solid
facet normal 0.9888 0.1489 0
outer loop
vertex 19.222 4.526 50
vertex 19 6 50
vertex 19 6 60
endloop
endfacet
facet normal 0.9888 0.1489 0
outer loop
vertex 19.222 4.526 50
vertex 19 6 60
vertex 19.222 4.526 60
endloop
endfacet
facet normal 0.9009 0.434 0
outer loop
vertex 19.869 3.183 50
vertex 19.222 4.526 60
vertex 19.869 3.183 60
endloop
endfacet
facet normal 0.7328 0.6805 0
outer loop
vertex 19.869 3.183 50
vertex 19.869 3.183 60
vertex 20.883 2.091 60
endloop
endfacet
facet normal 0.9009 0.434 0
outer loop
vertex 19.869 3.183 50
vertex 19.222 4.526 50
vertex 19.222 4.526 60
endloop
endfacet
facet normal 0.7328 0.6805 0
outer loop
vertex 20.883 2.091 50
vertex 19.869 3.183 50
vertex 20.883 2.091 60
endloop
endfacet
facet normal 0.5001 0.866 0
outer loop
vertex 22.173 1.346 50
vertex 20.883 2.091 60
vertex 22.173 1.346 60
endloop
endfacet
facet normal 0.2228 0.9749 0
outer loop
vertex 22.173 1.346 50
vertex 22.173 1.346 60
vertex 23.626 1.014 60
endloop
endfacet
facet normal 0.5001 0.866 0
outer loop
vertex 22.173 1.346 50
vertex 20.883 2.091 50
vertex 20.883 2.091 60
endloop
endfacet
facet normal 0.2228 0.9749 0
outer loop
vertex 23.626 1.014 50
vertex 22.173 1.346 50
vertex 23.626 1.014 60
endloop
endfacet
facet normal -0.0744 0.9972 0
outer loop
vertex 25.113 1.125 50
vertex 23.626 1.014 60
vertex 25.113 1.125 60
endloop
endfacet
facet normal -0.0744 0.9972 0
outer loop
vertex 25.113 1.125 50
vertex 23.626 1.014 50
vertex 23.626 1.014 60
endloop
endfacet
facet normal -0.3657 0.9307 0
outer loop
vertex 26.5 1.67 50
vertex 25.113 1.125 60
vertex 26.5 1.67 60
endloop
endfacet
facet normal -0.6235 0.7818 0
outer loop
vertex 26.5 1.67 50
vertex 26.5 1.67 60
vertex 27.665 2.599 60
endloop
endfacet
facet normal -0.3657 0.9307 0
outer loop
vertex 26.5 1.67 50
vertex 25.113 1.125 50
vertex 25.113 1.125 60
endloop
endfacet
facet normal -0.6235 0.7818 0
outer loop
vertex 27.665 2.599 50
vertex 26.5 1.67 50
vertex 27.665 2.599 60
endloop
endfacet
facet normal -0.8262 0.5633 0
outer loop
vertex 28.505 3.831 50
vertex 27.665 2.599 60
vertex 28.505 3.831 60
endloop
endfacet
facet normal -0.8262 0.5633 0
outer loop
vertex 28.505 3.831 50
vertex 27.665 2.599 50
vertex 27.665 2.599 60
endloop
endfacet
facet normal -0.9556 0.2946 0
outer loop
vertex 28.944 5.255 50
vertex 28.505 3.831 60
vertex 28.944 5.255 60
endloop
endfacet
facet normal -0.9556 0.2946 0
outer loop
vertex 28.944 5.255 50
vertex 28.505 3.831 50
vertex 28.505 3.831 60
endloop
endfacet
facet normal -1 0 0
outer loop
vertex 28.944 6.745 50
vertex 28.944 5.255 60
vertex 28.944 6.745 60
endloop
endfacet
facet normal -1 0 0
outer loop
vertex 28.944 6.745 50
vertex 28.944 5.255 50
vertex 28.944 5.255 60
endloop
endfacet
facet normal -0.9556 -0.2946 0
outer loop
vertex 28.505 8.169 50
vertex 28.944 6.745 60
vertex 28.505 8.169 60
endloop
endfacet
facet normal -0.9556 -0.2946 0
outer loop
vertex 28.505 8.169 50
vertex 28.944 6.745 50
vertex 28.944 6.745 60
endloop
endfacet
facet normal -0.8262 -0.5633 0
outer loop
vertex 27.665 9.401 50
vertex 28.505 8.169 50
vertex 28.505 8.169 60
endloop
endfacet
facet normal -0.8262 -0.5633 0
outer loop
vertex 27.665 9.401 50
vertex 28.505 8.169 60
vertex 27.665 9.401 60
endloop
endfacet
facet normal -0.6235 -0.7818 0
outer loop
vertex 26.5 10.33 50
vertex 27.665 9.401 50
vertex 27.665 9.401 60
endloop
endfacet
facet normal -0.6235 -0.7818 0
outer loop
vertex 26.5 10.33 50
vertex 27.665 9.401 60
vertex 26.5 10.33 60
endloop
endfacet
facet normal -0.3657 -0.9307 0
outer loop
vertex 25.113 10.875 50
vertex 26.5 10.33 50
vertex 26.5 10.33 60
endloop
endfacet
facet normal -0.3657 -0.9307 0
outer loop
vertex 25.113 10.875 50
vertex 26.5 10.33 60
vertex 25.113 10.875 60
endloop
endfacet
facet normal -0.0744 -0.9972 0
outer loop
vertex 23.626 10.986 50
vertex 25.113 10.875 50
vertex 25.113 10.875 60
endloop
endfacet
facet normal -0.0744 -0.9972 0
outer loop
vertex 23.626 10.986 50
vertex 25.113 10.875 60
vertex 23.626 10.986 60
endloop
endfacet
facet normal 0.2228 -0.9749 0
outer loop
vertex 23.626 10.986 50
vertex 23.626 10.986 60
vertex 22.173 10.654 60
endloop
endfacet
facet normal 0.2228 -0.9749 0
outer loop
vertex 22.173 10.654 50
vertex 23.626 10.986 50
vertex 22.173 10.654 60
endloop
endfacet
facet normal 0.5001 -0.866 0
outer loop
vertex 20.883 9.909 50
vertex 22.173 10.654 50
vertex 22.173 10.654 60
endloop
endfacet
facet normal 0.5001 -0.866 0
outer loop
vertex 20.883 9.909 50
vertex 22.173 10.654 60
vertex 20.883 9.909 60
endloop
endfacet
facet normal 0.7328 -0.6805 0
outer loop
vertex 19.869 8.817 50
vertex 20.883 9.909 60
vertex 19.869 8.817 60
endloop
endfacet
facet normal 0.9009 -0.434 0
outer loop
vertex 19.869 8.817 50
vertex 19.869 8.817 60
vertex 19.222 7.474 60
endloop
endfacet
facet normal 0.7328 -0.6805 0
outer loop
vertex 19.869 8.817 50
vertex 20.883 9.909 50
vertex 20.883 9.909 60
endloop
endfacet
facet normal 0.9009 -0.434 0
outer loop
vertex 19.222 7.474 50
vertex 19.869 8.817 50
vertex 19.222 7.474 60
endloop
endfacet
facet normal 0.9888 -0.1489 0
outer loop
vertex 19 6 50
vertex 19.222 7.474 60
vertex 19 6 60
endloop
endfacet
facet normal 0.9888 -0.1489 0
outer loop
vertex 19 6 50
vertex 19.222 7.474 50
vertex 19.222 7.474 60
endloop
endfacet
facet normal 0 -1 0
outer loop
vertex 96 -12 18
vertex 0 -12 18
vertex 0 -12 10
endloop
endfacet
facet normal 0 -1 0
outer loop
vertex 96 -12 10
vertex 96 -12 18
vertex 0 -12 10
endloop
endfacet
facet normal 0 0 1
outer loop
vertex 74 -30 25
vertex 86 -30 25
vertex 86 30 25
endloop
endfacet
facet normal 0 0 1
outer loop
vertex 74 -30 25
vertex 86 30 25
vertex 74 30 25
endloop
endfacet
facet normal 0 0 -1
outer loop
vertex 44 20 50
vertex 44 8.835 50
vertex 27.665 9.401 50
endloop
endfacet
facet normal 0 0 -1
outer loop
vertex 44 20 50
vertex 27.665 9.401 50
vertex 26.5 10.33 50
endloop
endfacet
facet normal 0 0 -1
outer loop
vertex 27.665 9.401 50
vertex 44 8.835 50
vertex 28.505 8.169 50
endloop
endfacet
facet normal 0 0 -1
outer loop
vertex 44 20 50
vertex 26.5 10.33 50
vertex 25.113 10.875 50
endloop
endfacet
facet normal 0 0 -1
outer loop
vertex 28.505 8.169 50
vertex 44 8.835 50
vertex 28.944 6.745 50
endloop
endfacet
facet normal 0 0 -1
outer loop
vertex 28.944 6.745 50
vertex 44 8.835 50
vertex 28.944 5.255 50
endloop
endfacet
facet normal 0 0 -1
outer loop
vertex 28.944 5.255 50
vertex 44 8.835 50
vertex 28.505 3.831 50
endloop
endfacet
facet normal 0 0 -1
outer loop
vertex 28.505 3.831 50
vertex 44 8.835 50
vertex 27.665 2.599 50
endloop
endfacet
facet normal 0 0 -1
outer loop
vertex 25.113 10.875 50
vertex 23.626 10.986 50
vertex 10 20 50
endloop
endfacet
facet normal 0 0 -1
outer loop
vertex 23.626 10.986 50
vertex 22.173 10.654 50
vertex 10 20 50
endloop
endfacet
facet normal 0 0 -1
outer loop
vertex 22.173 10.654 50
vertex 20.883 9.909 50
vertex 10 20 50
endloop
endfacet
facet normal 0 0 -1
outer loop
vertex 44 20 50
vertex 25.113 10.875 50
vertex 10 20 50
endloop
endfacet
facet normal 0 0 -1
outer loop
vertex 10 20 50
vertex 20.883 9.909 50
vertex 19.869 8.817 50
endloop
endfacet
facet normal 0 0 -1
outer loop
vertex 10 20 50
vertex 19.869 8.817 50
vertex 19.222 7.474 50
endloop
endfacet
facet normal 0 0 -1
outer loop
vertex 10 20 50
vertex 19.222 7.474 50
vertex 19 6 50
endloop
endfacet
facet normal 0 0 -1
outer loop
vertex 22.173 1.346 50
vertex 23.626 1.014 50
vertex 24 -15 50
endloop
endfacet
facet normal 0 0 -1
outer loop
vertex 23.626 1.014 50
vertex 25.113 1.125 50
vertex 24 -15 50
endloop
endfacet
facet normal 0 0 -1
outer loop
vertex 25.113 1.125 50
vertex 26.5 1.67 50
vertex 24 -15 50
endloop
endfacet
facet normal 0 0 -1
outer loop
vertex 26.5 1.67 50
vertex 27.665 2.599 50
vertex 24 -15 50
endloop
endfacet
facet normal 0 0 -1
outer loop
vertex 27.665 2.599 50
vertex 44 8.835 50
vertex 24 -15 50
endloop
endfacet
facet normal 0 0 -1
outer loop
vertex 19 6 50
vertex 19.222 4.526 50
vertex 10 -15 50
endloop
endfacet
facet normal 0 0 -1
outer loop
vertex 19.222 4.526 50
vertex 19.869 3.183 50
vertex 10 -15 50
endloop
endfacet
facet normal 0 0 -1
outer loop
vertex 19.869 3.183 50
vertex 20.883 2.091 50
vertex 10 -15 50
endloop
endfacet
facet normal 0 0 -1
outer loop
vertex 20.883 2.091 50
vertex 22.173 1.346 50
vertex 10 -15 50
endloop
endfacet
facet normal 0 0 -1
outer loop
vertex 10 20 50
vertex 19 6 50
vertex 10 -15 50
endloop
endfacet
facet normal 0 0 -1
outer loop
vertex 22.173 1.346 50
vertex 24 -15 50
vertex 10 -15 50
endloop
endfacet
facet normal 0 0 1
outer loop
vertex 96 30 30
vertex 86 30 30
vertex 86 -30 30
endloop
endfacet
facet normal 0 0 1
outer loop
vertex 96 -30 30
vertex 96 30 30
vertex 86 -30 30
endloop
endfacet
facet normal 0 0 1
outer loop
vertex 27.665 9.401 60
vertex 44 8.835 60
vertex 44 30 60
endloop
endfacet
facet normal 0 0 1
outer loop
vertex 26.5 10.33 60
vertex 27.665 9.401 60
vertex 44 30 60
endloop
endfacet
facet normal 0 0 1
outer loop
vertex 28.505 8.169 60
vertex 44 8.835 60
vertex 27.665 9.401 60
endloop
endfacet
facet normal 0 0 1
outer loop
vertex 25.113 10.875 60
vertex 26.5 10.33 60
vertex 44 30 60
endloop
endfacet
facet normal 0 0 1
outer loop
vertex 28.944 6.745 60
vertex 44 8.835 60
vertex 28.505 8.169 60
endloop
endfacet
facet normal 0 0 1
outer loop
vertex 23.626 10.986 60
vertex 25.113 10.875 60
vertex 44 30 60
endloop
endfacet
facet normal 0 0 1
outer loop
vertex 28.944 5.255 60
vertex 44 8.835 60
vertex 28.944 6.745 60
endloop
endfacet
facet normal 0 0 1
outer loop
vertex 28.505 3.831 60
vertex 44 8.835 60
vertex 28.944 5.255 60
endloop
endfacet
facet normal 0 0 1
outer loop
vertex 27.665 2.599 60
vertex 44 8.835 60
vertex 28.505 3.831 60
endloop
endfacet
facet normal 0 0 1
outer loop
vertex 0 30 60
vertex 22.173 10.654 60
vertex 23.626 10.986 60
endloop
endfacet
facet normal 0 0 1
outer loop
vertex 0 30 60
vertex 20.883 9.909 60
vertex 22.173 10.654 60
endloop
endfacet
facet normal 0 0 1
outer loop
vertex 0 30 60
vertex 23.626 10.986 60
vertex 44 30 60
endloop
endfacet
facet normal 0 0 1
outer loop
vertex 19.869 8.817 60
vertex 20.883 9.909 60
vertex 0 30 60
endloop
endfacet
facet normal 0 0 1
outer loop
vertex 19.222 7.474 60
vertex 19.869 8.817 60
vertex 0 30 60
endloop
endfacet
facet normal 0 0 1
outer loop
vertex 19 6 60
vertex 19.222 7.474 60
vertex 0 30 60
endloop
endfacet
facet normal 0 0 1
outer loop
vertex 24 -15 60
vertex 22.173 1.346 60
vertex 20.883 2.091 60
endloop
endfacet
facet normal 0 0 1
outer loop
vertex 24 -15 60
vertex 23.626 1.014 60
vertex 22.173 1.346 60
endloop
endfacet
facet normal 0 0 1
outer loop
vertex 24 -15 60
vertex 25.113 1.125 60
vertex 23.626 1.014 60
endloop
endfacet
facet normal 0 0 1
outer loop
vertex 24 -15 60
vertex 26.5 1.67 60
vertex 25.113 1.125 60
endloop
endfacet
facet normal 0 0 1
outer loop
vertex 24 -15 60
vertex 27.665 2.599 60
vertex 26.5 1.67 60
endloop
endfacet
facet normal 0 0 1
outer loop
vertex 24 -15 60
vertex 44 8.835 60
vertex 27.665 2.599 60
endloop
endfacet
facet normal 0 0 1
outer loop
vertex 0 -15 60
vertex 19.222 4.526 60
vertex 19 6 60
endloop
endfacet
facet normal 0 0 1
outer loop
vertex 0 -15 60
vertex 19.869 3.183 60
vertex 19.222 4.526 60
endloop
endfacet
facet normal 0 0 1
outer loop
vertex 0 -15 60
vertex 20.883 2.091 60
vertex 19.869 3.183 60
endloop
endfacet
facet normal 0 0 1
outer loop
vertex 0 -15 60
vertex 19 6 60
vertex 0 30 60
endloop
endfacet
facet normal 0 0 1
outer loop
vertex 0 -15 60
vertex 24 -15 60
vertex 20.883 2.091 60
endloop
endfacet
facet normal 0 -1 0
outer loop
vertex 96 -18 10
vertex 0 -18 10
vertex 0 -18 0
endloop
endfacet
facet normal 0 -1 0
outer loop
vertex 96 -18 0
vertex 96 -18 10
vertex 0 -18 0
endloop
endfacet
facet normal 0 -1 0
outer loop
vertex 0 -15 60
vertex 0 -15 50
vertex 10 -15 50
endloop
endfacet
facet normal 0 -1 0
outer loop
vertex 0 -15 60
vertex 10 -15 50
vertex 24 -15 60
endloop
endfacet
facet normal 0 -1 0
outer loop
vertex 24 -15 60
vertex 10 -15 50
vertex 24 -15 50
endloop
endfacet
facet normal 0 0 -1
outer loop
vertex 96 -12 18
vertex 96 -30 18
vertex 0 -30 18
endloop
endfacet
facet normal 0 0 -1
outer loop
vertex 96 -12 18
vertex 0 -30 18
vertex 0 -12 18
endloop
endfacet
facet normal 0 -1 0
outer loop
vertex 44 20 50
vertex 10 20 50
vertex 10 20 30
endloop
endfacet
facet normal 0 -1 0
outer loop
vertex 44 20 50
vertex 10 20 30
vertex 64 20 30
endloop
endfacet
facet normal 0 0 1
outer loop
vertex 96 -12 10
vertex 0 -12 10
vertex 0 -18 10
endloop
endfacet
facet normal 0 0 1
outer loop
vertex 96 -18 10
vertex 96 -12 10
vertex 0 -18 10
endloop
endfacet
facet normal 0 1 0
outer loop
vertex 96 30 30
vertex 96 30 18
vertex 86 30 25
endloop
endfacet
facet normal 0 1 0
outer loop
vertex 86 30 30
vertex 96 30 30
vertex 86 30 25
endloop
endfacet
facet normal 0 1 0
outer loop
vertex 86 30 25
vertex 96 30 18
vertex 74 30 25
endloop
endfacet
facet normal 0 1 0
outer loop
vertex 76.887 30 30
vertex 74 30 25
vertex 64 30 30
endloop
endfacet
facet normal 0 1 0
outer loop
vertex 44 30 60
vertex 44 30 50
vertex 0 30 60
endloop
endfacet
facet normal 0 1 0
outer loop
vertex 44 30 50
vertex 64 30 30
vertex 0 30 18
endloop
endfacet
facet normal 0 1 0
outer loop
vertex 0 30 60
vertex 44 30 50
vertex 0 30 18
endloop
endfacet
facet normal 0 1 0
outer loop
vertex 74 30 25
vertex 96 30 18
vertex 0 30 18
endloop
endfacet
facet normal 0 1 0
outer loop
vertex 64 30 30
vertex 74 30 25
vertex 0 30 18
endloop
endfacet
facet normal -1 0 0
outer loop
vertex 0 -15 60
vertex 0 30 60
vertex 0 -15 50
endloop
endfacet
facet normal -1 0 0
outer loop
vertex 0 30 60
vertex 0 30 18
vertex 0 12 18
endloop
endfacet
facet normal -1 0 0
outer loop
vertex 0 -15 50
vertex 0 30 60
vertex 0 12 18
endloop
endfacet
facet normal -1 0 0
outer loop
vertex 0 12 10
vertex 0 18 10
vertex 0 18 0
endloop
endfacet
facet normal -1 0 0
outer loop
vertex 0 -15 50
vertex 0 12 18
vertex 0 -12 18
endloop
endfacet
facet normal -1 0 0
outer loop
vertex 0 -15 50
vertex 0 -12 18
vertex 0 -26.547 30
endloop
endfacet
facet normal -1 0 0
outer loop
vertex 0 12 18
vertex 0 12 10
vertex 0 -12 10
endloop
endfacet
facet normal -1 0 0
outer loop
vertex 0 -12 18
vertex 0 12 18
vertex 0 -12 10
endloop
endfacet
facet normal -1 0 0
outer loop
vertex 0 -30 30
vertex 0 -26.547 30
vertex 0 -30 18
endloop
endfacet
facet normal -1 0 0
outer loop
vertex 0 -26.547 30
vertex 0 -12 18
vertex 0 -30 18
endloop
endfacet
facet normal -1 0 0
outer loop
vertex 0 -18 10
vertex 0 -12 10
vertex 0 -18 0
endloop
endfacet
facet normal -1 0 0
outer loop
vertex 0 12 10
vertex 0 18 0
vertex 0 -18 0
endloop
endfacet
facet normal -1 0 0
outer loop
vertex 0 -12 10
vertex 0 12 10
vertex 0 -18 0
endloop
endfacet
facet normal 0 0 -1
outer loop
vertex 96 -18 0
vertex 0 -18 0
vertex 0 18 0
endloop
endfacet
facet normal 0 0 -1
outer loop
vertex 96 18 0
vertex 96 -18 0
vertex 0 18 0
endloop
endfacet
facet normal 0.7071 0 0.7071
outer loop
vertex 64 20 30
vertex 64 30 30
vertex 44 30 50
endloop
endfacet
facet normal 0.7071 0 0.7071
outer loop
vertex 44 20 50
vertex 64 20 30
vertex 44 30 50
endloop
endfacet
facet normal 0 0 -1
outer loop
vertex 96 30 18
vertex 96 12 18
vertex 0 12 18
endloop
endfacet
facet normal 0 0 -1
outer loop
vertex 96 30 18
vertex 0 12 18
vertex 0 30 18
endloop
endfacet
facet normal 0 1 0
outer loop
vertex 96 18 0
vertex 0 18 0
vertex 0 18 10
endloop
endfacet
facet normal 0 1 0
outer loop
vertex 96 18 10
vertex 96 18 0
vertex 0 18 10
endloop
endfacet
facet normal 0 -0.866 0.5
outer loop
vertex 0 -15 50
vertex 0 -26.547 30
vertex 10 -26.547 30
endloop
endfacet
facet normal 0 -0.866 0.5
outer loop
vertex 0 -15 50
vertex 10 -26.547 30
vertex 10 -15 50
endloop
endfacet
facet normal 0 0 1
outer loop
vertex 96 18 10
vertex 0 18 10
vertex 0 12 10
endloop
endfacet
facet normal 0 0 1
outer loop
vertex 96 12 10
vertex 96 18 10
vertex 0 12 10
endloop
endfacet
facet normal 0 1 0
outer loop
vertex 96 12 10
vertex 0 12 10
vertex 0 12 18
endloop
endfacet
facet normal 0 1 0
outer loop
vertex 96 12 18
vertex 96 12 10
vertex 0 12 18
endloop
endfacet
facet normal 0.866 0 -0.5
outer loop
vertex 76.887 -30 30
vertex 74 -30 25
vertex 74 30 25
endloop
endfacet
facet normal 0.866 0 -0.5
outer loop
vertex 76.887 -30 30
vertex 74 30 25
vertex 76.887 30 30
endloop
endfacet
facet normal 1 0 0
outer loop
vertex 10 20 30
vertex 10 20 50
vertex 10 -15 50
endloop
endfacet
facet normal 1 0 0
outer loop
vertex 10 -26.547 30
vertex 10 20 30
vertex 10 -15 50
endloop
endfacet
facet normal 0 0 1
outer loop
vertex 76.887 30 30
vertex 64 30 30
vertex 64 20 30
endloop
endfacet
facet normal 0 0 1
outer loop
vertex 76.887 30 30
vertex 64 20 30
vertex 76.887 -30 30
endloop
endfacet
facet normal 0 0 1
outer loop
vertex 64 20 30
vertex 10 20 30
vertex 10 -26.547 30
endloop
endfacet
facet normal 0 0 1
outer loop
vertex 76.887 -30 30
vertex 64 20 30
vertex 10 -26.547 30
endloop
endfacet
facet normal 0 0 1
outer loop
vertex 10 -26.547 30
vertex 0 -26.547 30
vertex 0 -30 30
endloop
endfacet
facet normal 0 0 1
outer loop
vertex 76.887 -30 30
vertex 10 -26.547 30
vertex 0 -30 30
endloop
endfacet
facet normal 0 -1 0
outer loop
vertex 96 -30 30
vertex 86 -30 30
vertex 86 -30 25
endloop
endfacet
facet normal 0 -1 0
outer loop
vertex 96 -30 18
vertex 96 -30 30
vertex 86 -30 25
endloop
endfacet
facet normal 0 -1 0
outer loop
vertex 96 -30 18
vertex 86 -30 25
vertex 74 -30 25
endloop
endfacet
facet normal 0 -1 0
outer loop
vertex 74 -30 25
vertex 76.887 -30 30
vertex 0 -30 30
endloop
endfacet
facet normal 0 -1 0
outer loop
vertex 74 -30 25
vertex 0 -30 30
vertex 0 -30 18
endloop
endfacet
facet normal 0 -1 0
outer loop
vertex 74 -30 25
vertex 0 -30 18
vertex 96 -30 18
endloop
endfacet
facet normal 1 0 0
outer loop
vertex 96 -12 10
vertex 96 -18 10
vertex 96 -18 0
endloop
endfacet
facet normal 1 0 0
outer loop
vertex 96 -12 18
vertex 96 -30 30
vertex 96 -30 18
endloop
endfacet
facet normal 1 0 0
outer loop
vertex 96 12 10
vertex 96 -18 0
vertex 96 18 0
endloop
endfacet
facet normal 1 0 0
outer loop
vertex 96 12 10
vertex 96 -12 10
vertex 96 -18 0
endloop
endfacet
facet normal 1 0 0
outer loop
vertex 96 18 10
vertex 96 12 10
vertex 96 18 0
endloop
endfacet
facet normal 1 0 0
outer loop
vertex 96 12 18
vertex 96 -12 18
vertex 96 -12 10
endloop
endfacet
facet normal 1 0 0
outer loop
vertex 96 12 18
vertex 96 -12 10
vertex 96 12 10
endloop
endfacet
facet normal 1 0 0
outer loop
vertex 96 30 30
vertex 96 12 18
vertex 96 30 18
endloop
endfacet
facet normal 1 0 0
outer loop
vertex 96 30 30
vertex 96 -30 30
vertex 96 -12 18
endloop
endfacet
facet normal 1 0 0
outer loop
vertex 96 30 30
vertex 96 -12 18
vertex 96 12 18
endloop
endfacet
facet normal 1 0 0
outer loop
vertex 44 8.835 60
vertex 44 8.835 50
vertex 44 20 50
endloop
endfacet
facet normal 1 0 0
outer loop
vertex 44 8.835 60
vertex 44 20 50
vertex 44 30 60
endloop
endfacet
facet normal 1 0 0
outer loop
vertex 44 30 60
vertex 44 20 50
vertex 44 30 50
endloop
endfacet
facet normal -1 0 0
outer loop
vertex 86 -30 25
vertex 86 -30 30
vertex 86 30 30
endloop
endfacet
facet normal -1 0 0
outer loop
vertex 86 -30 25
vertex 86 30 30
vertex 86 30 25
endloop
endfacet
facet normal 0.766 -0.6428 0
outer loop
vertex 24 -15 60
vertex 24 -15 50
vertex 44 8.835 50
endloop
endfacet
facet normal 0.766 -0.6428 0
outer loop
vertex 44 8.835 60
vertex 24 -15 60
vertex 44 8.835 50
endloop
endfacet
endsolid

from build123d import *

# Parameters (mm, degrees)
PAD001_DEPTH = 10
PAD002_DEPTH = 10
SKETCH004_R  = 5
PAD003_DEPTH = 10
PAD_DEPTH    = 96
POCKET_DEPTH = 60.001


with BuildPart() as pad001:
    # Sketch002 → Pad001 (new body)
    with BuildSketch(Plane.YZ):
        Polygon((30, 30), (-26.547005, 30), (-15, 50), (30, 50), align=None)
    extrude(amount=PAD001_DEPTH)


with BuildPart() as pad003:
    # Sketch003 → Pad002 (new body)
    with BuildSketch(Plane.XZ.offset(-30)):
        Polygon((10, 50), (10, 30), (64, 30), (44, 50), align=None)
    extrude(amount=PAD002_DEPTH)

    # Sketch004 → Pad003 (new body)
    with BuildSketch(Plane(origin=(0, 30, 50), x_dir=(-1, 0, 0), z_dir=(0, 0, 1))):
        Polygon((0, 0), (0, 45), (-24, 45), (-44, 21.164928), (-44, 0), align=None)
        with Locations((-24, 24)):
            Circle(SKETCH004_R, mode=Mode.SUBTRACT)
    extrude(amount=PAD003_DEPTH)


with BuildPart() as fusion:
    # Sketch → Pad (new body)
    with BuildSketch(Plane.YZ):
        Polygon((-18, 0), (18, 0), (18, 10), (12, 10), (12, 18), (30, 18), (30, 30), (-30, 30), (-30, 18), (-12, 18), (-12, 10), (-18, 10), align=None)
    extrude(amount=PAD_DEPTH)

    # Sketch001 → Pocket (cut, through all)
    with BuildSketch(Plane(origin=(0, -30, 0), x_dir=(0, 0, -1), z_dir=(0, -1, 0))):
        Polygon((-33.660889, 86), (-25, 86), (-25, 74), (-33.660889, 79.000366), align=None)
    extrude(amount=-POCKET_DEPTH, mode=Mode.SUBTRACT)

    # Fusion: union Pad001, Pad003
    add(pad001.part)
    add(pad003.part)


solid = fusion.part
